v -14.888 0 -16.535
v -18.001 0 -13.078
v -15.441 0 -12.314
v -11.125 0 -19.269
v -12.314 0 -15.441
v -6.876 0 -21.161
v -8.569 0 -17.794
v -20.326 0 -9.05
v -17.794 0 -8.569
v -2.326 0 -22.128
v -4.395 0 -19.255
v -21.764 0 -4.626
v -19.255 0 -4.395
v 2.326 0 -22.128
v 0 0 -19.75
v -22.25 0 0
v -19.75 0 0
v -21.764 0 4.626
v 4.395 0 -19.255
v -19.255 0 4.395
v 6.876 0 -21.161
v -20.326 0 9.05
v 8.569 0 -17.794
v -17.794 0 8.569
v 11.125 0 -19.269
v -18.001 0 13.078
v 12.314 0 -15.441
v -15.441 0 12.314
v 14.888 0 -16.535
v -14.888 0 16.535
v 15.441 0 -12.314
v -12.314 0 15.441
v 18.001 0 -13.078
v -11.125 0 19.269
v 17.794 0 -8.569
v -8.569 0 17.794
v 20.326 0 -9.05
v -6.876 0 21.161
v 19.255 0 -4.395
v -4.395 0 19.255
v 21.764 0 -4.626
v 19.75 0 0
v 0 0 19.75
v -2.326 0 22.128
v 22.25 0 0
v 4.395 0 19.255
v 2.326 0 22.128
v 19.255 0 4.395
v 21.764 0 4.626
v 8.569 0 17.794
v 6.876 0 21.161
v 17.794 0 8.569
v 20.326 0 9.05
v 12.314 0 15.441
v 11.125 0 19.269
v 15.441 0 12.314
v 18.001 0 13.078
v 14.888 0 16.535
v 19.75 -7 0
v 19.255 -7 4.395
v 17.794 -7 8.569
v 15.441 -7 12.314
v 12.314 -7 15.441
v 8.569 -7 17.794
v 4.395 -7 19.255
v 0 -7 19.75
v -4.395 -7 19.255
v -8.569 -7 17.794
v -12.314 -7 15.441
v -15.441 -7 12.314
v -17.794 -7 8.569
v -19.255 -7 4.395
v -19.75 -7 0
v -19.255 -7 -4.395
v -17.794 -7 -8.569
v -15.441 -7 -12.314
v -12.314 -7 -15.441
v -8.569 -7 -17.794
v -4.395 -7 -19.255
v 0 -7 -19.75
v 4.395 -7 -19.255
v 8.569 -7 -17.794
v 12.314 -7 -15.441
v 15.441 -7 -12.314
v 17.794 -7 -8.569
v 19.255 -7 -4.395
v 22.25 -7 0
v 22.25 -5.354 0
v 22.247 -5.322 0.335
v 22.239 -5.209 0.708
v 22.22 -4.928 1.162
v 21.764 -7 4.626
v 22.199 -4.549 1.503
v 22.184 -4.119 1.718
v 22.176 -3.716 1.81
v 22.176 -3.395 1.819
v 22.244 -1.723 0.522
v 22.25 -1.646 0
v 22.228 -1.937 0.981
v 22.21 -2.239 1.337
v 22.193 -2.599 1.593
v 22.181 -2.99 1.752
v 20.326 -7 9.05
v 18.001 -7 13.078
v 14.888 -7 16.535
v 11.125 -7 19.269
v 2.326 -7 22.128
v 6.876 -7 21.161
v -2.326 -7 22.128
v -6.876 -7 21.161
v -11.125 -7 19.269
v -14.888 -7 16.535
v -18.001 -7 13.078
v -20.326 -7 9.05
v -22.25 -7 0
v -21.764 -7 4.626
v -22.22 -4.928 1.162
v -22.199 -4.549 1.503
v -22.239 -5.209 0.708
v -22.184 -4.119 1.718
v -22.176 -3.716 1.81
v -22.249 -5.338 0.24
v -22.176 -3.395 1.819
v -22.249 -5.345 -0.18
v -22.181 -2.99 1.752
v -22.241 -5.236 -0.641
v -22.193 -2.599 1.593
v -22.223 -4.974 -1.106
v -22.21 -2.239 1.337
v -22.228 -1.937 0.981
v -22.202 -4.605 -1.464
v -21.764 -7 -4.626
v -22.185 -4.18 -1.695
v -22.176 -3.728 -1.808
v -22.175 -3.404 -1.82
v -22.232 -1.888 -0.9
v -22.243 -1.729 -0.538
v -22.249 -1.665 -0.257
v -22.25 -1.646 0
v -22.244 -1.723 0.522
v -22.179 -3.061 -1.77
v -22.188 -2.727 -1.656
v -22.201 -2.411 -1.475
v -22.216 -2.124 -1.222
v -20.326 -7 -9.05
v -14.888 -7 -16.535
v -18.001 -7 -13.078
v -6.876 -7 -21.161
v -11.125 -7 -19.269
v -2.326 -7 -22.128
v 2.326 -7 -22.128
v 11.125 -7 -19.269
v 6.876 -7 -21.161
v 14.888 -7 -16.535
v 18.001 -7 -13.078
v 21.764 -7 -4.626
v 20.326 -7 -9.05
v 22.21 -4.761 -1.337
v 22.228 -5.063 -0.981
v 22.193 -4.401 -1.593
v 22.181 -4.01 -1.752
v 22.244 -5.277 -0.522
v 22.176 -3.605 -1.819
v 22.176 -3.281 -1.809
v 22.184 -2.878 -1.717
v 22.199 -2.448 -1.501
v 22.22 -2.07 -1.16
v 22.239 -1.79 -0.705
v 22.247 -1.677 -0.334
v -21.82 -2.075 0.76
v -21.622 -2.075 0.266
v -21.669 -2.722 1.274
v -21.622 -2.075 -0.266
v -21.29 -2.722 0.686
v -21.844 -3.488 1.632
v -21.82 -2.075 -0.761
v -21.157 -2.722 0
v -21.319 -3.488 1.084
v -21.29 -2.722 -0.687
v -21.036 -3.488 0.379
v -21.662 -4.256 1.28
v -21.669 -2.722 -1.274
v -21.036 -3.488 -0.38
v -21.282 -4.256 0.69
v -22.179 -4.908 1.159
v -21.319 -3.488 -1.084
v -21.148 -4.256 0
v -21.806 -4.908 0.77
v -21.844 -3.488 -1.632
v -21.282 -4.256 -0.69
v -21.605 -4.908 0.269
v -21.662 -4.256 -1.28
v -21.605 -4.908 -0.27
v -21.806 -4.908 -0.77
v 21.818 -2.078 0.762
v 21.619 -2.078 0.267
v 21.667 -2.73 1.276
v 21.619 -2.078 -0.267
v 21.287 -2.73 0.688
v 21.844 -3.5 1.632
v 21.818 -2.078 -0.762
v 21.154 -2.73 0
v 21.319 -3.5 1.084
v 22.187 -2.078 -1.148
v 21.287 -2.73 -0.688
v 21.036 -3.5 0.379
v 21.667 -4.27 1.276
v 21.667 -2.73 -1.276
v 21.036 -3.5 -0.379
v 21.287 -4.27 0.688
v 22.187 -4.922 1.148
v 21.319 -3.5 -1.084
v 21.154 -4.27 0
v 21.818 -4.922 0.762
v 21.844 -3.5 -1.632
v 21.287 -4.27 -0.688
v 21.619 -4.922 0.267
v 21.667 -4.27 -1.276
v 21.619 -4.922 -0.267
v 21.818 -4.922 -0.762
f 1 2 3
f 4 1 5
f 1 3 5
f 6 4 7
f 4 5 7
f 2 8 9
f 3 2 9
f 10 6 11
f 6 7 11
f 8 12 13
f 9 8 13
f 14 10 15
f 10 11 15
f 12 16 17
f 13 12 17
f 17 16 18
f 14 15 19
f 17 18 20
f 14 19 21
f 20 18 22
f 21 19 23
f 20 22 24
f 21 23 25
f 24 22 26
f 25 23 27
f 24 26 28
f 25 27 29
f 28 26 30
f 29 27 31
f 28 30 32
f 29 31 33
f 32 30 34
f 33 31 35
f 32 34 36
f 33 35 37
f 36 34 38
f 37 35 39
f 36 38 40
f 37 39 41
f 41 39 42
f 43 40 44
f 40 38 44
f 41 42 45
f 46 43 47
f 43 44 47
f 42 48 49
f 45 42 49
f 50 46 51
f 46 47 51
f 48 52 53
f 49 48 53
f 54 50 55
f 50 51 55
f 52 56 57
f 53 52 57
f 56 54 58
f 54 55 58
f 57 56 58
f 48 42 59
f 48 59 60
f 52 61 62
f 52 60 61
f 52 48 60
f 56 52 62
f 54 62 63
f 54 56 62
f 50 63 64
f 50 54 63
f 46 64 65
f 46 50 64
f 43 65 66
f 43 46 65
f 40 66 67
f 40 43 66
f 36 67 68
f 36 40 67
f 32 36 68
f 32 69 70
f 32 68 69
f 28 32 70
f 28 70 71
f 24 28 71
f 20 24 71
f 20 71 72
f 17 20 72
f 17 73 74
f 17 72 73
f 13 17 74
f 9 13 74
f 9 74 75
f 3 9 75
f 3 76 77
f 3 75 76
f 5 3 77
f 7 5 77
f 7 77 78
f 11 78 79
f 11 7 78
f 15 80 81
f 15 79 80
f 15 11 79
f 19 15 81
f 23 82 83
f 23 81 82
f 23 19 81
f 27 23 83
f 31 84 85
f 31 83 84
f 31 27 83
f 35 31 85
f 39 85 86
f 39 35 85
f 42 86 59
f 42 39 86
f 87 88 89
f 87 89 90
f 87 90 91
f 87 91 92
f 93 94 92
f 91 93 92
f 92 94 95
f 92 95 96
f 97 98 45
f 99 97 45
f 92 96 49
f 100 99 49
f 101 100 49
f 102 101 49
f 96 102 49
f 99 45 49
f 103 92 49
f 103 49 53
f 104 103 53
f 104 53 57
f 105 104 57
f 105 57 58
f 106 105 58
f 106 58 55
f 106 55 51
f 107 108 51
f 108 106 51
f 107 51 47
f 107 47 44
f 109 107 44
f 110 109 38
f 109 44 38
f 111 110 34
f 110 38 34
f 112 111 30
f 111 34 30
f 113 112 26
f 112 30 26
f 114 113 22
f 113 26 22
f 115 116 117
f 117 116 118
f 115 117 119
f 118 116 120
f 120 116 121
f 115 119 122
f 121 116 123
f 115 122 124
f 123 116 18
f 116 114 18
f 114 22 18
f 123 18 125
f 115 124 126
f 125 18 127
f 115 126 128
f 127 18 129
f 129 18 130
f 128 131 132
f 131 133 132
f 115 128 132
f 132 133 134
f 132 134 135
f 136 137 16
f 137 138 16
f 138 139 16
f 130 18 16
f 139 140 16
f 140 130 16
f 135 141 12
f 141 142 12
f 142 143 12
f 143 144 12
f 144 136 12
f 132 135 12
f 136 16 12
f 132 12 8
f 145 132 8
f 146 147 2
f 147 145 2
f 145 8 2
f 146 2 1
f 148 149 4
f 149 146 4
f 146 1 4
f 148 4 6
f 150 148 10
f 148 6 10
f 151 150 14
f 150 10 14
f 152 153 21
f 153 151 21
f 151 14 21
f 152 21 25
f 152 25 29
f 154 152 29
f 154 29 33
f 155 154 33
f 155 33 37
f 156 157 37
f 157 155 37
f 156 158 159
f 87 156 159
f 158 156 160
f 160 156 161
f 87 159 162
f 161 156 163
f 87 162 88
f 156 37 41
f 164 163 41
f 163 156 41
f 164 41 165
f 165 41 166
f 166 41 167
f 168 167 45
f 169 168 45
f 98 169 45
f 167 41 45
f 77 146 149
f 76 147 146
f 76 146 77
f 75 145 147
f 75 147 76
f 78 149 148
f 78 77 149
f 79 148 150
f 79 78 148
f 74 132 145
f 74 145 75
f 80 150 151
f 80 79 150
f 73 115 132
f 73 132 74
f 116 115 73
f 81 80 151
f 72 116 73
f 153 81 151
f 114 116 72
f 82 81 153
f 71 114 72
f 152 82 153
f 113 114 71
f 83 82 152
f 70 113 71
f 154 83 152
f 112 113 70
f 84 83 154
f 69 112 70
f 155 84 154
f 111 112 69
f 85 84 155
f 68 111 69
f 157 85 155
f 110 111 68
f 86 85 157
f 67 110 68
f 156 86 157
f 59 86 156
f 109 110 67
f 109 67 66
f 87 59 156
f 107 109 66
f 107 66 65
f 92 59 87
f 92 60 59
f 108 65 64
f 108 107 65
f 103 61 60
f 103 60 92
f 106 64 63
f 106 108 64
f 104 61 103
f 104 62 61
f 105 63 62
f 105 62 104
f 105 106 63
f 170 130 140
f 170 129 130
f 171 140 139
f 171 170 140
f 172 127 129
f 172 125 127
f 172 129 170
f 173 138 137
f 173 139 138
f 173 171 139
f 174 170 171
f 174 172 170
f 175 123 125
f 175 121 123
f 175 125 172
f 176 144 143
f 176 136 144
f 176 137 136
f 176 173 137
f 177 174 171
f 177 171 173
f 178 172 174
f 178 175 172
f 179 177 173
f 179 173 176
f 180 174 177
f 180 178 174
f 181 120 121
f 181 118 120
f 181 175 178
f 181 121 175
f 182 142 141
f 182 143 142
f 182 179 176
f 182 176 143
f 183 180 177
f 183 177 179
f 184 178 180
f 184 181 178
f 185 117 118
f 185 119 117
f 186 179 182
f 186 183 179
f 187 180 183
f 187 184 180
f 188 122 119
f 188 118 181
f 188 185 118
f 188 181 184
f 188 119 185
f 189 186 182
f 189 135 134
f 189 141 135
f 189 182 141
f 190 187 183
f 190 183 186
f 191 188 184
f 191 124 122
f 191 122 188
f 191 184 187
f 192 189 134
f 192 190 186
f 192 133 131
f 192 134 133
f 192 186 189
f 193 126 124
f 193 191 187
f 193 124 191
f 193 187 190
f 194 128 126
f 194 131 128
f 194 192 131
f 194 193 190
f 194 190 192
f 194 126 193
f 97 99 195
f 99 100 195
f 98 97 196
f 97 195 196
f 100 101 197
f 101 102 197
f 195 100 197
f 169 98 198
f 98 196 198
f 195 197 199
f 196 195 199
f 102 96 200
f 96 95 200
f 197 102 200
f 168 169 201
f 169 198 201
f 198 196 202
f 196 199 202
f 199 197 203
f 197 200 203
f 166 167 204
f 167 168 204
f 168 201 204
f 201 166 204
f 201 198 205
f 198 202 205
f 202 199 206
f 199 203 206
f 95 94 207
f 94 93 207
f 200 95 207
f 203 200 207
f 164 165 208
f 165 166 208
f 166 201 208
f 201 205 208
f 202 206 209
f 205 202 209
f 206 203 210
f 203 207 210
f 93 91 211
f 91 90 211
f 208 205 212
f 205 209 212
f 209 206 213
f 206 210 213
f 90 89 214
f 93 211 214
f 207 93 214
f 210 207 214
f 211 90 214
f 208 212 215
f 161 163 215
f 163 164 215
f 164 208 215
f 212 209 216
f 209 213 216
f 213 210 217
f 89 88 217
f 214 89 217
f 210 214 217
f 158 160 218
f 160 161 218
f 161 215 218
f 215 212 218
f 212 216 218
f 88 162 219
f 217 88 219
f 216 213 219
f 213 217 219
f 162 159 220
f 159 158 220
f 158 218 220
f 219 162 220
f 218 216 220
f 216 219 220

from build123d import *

# Parameters (mm, degrees)
F0_R     = 22.25
F0_R_2   = 19.75
F1_DEPTH = 7


# Not quite as in the source:
# - a feature of the source that left no trace in its solid (it failed there, or was rolled back) is left out
# - the program builds the solid bodies; features that only make, move or delete a surface that nothing else refers to are left out


with BuildPart() as f1:
    # F0 (on Front) → F1 (new body)
    with BuildSketch(Plane.XZ):
        Circle(F0_R)
        Circle(F0_R_2, mode=Mode.SUBTRACT)
    extrude(amount=F1_DEPTH)

    # F7 (on offset) → F8 (revolve, cut)
    with BuildSketch(Plane.YZ.offset(23)):
        with BuildLine():
            Line((-5.5, 0), (-1.5, 0))
            ThreePointArc((-1.5, 0), (-3.5, 2), (-5.5, 0))
        make_face()
    revolve(axis=Axis((23, -3.487871727, 0), (0, -1, 0)), mode=Mode.SUBTRACT)

    # F9: F1 across plane


with BuildPart() as f1_1:
    add(f1.part)
    add(f1.part.mirror(Plane.YZ), mode=Mode.INTERSECT)


solid = f1_1.part
